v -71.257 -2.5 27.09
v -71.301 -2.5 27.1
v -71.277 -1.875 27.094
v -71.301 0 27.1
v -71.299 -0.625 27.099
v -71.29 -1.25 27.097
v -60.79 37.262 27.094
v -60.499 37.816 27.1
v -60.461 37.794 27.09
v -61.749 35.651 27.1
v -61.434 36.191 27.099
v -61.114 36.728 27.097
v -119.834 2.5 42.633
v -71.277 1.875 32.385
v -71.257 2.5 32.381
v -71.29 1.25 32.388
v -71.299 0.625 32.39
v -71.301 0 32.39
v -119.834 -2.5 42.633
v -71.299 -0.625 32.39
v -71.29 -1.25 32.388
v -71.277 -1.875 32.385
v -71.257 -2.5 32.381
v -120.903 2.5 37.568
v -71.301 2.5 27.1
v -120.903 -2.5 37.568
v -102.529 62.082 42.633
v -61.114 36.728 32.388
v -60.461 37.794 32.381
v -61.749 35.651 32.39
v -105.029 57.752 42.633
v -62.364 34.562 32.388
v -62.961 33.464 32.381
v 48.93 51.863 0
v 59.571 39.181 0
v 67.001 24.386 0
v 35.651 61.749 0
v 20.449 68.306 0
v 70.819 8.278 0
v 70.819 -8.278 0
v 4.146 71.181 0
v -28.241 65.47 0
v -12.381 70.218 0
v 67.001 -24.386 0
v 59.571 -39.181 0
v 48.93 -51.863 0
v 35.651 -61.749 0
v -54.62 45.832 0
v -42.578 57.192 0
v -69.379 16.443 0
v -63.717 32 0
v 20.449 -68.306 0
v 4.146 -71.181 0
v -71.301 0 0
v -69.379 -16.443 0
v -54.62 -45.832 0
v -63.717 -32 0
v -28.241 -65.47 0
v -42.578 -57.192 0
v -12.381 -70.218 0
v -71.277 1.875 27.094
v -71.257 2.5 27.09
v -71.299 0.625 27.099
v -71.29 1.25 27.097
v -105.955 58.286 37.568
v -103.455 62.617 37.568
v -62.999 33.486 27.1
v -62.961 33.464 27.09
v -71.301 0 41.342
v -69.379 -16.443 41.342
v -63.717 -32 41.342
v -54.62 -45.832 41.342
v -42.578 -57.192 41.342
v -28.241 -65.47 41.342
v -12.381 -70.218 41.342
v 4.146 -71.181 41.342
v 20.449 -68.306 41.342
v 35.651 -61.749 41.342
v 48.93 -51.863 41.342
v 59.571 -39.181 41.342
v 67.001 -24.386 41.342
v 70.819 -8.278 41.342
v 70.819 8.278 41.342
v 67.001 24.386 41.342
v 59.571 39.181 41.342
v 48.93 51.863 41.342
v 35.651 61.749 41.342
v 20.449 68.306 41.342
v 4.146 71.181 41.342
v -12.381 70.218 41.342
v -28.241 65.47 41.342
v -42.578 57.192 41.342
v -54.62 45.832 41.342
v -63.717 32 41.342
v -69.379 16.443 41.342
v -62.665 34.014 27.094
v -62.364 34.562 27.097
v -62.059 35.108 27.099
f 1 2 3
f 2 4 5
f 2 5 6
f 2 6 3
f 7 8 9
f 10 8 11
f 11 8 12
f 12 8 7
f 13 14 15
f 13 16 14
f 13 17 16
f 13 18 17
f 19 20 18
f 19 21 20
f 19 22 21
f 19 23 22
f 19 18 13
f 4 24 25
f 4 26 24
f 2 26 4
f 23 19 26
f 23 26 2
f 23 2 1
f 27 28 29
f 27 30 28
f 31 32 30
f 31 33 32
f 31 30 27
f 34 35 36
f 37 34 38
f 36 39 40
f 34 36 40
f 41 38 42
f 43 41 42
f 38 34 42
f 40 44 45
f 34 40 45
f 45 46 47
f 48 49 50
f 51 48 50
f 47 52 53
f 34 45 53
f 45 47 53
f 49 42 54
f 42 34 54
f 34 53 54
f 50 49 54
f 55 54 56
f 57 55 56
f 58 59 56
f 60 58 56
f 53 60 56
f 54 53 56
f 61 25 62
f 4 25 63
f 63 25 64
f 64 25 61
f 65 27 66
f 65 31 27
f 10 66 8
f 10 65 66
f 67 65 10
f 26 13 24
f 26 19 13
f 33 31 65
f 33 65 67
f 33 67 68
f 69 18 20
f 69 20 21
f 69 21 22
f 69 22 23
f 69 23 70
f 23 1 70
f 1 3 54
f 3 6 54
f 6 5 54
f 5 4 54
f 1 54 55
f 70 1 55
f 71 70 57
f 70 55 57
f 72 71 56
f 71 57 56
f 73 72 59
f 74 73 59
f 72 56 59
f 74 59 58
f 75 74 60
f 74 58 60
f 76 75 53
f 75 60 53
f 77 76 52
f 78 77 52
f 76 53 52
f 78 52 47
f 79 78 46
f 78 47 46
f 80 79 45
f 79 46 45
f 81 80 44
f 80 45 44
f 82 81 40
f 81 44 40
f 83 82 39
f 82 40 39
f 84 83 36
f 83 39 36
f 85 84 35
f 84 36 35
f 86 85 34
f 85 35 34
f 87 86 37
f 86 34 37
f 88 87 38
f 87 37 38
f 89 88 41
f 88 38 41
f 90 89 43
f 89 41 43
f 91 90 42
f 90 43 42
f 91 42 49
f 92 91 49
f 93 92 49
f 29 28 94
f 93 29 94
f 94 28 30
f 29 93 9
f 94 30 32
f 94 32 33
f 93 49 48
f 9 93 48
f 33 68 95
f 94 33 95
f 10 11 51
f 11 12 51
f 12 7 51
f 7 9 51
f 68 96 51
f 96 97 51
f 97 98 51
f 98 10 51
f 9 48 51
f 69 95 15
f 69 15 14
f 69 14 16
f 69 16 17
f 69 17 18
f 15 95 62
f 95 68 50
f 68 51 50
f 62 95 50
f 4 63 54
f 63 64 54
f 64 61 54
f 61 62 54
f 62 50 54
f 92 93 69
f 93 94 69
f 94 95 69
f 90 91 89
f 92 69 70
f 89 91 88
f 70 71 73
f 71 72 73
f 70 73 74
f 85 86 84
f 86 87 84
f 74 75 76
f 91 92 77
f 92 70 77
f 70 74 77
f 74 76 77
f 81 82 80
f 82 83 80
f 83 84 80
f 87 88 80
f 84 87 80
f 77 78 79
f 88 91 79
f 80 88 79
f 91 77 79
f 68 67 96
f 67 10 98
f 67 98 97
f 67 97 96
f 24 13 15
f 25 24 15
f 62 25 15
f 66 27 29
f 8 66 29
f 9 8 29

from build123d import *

# Parameters (mm, degrees)
F2_DEPTH = 2.5
F3_COUNT = 2
F3_ANGLE = 30


with BuildPart() as f1:
    # F0 (on Front) → F1 (revolve)
    with BuildSketch(Plane.XZ):
        Polygon((-71.3012740016, 0), (0, 0), (0, 41.3423627615), (-71.3012740016, 41.3423627615), (-71.3012740016, 32.3902414565), (-51.2194111943, 28.151858598), (-52.2884099565, 23.0868403589), (-71.3012740016, 27.0996054014), align=None)
        Polygon((-71.3012740016, 32.3902414565), (-71.3012740016, 27.0996054014), (-52.2884099565, 23.0868403589), (-51.2194111943, 28.151858598), align=None)
    revolve(axis=Axis((0, 0, 20.6711813807), (0, 0, 1)))

    # F0 (on Front) → F2 (join, symmetric)
    with BuildSketch(Plane.XZ):
        Polygon((-120.9029449902, 37.5682991719), (-71.3012740016, 27.0996054014), (-71.3012740016, 32.3902414565), (-119.833946228, 42.6333174109), align=None)
        Polygon((-71.3012740016, 32.3902414565), (-71.3012740016, 27.0996054014), (-52.2884099565, 23.0868403589), (-51.2194111943, 28.151858598), align=None)
    f2 = extrude(amount=F2_DEPTH, both=True)

    # F3: F2 ×2 about axis
    f3_axis = Axis((0, 0, 41.3423627615), (0, 0, -1))
    for i in range(1, F3_COUNT):
        add(f2.rotate(f3_axis, i * F3_ANGLE / (F3_COUNT - 1)))


solid = f1.part
